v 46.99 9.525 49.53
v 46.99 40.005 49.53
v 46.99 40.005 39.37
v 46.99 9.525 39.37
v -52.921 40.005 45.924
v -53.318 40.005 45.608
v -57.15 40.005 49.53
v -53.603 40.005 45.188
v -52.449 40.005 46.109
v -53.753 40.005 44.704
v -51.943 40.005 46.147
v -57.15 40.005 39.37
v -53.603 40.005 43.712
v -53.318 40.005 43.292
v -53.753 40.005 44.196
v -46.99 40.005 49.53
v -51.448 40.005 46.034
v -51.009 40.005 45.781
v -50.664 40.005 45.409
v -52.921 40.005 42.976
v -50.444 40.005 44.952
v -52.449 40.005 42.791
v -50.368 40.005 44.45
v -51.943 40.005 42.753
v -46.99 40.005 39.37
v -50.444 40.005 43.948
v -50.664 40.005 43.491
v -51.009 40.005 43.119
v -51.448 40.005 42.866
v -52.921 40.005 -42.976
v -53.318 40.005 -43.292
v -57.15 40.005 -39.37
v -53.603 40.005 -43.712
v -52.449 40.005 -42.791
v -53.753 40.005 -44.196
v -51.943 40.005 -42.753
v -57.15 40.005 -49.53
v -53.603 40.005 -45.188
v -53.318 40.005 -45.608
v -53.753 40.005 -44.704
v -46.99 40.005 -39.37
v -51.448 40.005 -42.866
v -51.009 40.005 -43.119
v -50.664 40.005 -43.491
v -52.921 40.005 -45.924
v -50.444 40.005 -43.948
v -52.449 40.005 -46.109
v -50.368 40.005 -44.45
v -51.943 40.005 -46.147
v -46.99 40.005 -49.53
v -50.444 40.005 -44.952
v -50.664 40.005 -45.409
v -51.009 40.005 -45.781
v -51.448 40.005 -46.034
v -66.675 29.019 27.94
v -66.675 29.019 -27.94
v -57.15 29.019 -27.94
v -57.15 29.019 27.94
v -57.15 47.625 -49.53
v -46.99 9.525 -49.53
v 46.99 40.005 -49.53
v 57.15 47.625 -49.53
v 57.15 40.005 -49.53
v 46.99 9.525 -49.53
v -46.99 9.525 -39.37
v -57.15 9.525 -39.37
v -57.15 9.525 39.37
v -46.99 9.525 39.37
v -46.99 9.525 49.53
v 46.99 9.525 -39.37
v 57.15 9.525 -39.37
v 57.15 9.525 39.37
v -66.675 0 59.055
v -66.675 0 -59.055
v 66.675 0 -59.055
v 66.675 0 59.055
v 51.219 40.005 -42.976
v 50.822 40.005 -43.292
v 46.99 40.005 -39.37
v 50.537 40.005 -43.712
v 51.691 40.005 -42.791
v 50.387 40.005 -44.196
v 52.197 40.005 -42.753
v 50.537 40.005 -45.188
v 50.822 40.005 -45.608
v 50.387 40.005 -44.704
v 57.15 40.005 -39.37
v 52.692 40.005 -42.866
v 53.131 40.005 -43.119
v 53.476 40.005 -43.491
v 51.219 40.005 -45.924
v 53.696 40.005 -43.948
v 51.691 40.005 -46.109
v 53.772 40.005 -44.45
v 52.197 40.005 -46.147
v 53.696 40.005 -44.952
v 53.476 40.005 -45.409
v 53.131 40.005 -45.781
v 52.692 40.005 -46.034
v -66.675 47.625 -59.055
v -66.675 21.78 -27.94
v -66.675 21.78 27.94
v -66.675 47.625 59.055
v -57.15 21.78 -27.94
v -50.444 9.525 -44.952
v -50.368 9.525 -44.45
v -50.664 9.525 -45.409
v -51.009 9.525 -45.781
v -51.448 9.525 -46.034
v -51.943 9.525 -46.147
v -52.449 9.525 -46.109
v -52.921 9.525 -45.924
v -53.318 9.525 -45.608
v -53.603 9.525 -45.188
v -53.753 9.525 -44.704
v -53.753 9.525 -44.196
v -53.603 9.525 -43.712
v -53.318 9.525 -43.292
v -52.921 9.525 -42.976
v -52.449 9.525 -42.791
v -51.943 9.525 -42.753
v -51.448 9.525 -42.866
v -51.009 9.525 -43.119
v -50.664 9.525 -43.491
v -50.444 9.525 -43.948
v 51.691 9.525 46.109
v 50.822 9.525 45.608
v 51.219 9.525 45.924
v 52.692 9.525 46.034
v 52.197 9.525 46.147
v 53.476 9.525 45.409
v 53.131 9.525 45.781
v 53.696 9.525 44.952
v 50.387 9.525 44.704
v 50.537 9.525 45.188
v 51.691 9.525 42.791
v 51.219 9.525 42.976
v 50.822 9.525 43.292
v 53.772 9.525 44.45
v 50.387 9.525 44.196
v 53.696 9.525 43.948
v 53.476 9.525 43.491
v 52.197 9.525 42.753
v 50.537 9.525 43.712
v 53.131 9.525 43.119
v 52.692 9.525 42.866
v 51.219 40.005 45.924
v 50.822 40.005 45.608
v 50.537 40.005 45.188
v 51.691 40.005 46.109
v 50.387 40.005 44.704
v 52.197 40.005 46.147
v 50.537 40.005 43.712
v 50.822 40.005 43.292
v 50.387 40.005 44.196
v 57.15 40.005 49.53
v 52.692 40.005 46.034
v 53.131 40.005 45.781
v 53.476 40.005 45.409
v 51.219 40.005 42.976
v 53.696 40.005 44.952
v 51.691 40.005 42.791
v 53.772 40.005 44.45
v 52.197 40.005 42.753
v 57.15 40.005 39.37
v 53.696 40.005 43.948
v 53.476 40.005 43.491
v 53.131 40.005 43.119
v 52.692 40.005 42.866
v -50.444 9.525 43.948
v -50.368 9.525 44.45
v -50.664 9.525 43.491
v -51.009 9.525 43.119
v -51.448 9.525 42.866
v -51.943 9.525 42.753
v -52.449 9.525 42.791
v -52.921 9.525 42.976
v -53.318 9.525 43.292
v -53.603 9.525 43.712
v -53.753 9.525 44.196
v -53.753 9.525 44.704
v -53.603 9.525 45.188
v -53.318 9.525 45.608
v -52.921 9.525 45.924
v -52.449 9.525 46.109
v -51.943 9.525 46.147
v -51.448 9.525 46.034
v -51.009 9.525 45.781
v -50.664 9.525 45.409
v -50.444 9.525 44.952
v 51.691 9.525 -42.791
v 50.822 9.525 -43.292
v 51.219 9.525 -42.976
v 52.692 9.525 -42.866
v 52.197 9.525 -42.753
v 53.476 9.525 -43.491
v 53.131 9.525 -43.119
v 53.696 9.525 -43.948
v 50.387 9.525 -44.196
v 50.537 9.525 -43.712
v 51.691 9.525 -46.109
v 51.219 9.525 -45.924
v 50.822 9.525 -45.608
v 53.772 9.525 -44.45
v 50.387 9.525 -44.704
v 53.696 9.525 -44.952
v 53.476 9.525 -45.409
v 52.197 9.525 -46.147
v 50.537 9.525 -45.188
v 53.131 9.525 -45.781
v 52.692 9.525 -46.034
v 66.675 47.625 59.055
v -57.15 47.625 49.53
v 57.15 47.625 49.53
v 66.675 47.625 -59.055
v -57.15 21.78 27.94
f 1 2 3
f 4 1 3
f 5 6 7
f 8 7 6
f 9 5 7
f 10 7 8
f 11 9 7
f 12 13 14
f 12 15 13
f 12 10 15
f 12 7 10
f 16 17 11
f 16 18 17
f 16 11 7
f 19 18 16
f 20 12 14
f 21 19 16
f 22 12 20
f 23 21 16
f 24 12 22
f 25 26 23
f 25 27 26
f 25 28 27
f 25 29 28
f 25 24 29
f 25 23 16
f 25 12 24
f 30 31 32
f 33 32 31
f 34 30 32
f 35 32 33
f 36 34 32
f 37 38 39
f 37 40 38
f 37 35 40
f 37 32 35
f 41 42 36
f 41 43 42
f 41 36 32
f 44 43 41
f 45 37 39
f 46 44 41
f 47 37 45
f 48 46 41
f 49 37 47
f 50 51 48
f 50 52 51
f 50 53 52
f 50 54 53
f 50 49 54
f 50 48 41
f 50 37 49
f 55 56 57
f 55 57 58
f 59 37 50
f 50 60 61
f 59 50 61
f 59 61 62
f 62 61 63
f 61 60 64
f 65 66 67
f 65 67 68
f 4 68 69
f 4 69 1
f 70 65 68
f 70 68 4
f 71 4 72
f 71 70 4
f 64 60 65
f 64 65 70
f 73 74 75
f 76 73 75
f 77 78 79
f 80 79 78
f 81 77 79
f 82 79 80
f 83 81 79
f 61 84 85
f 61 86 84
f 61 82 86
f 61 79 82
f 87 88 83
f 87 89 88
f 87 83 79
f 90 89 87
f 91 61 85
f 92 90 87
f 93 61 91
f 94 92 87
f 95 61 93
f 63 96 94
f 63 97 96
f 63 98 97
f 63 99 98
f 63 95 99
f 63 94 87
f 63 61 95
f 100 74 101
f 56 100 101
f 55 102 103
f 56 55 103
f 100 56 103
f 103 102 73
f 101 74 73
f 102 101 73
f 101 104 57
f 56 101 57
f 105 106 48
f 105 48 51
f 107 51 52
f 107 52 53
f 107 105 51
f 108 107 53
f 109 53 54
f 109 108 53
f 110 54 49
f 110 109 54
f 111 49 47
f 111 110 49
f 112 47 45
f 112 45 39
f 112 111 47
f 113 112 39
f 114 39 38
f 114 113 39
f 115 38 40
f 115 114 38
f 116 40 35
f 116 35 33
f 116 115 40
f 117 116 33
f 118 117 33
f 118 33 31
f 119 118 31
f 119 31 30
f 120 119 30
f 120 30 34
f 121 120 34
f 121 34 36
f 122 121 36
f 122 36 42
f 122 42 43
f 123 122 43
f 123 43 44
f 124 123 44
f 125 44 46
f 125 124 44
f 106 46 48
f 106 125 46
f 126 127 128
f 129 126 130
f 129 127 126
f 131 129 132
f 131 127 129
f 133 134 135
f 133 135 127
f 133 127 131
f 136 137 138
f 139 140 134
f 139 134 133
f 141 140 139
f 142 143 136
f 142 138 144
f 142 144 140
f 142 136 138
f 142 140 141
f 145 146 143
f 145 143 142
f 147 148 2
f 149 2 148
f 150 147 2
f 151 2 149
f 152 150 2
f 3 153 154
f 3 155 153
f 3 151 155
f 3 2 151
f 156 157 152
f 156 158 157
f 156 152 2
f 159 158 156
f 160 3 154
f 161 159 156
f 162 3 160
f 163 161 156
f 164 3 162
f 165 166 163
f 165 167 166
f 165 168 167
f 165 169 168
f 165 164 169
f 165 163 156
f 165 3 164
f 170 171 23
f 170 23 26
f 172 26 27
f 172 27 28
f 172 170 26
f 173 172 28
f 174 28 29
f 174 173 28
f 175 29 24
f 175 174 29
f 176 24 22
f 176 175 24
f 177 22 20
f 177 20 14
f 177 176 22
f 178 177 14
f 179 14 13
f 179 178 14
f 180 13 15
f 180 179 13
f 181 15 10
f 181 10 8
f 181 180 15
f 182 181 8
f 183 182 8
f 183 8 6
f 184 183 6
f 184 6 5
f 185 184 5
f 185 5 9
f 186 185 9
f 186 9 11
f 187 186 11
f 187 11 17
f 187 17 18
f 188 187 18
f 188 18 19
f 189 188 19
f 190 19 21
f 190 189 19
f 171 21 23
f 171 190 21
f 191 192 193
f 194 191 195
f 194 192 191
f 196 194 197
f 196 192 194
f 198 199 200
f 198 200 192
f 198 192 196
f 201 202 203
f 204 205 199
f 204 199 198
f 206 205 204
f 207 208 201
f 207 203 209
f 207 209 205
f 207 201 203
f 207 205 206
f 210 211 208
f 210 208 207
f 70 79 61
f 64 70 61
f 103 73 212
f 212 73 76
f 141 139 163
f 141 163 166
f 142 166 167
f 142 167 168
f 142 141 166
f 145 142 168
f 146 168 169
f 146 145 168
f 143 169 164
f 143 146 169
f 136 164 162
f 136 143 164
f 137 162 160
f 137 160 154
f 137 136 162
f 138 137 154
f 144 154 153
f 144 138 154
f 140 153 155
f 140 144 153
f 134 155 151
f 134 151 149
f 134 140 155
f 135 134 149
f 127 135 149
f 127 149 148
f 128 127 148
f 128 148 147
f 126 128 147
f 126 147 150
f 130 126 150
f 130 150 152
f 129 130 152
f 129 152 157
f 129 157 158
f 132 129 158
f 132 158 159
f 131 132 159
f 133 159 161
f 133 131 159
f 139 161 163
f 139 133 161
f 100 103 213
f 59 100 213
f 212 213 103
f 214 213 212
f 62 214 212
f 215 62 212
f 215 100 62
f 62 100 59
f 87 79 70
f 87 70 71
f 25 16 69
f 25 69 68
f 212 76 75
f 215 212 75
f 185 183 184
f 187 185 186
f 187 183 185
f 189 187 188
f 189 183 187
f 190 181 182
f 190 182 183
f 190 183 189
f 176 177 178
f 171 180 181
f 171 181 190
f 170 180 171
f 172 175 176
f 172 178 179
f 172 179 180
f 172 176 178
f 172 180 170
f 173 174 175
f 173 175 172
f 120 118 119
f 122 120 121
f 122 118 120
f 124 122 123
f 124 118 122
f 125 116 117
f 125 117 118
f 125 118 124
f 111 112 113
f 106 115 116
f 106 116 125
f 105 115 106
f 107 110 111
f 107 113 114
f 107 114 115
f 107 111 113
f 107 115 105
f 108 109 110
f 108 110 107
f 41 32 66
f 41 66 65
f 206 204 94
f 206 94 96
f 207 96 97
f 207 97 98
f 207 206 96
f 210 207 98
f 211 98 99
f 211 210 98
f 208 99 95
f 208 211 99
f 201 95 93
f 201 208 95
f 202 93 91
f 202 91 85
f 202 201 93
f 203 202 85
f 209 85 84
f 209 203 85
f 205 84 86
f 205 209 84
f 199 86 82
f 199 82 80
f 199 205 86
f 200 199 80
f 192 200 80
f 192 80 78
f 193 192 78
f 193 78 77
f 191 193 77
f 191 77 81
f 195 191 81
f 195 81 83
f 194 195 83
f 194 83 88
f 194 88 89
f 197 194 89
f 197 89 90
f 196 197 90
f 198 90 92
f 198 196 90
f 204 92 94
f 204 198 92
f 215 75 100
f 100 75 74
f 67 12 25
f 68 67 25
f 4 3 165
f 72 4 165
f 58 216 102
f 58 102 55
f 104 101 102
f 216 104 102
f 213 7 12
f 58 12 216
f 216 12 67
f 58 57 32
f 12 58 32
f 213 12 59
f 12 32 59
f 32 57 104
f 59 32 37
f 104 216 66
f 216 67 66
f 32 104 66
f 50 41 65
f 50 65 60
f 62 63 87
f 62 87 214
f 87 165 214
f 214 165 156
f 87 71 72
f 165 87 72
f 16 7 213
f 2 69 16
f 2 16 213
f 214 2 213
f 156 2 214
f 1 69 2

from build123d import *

# Parameters (mm, degrees)
SKETCH1_W           = 114.3
SKETCH1_H           = 99.06
BOSS_EXTRUDE1_DEPTH = 9.525
SKETCH1_3_W         = 133.35
SKETCH1_3_H         = 118.11
SKETCH1_3_W_2       = 114.3
SKETCH1_3_H_2       = 99.06
BOSS_EXTRUDE2_DEPTH = 47.625
SKETCH3_W           = 10.16
SKETCH3_H           = 10.16
SKETCH3_R           = 1.7018
BOSS_EXTRUDE3_DEPTH = 30.48
SKETCH5_W           = 55.88
SKETCH5_H           = 7.239
CUT_EXTRUDE1_DEPTH  = 30.48


with BuildPart() as part:
    # Sketch1 → Boss-Extrude1 (new body)
    with BuildSketch(Plane(origin=(0, 0, 0), x_dir=(1, 0, 0), z_dir=(0, 1, 0))):
        Rectangle(SKETCH1_W, SKETCH1_H)
    extrude(amount=BOSS_EXTRUDE1_DEPTH)

    # Sketch1<3> → Boss-Extrude2 (add)
    with BuildSketch(Plane(origin=(0, 0, 0), x_dir=(1, 0, 0), z_dir=(0, 1, 0))):
        Rectangle(SKETCH1_3_W, SKETCH1_3_H)
        Rectangle(SKETCH1_3_W_2, SKETCH1_3_H_2, mode=Mode.SUBTRACT)
    extrude(amount=BOSS_EXTRUDE2_DEPTH)

    # Sketch3 → Boss-Extrude3 (add)
    # profile 1 of 4: a face of its own
    with BuildSketch(Plane(origin=(0, 9.525, 0), x_dir=(1, 0, 0), z_dir=(0, 1, 0))):
        with Locations((-52.07, 44.45)):
            Rectangle(SKETCH3_W, SKETCH3_H)
        with Locations((-52.07, 44.45)):
            Circle(SKETCH3_R, mode=Mode.SUBTRACT)
    # profile 2 of 4: a face of its own
    with BuildSketch(Plane(origin=(0, 9.525, 0), x_dir=(1, 0, 0), z_dir=(0, 1, 0))):
        with Locations((52.07, 44.45)):
            Rectangle(SKETCH3_W, SKETCH3_H)
        with Locations((52.07, 44.45)):
            Circle(SKETCH3_R, mode=Mode.SUBTRACT)
    # profile 3 of 4: a face of its own
    with BuildSketch(Plane(origin=(0, 9.525, 0), x_dir=(1, 0, 0), z_dir=(0, 1, 0))):
        with Locations((52.07, -44.45)):
            Rectangle(SKETCH3_W, SKETCH3_H)
        with Locations((52.07, -44.45)):
            Circle(SKETCH3_R, mode=Mode.SUBTRACT)
    # profile 4 of 4: a face of its own
    with BuildSketch(Plane(origin=(0, 9.525, 0), x_dir=(1, 0, 0), z_dir=(0, 1, 0))):
        with Locations((-52.07, -44.45)):
            Rectangle(SKETCH3_W, SKETCH3_H)
        with Locations((-52.07, -44.45)):
            Circle(SKETCH3_R, mode=Mode.SUBTRACT)
    extrude(amount=BOSS_EXTRUDE3_DEPTH)

    # Sketch5 → Cut-Extrude1 (cut)
    with BuildSketch(Plane.ZY.offset(66.675)):
        with Locations((0, 25.4)):
            Rectangle(SKETCH5_W, SKETCH5_H)
    extrude(amount=-CUT_EXTRUDE1_DEPTH, mode=Mode.SUBTRACT)


solid = part.part
